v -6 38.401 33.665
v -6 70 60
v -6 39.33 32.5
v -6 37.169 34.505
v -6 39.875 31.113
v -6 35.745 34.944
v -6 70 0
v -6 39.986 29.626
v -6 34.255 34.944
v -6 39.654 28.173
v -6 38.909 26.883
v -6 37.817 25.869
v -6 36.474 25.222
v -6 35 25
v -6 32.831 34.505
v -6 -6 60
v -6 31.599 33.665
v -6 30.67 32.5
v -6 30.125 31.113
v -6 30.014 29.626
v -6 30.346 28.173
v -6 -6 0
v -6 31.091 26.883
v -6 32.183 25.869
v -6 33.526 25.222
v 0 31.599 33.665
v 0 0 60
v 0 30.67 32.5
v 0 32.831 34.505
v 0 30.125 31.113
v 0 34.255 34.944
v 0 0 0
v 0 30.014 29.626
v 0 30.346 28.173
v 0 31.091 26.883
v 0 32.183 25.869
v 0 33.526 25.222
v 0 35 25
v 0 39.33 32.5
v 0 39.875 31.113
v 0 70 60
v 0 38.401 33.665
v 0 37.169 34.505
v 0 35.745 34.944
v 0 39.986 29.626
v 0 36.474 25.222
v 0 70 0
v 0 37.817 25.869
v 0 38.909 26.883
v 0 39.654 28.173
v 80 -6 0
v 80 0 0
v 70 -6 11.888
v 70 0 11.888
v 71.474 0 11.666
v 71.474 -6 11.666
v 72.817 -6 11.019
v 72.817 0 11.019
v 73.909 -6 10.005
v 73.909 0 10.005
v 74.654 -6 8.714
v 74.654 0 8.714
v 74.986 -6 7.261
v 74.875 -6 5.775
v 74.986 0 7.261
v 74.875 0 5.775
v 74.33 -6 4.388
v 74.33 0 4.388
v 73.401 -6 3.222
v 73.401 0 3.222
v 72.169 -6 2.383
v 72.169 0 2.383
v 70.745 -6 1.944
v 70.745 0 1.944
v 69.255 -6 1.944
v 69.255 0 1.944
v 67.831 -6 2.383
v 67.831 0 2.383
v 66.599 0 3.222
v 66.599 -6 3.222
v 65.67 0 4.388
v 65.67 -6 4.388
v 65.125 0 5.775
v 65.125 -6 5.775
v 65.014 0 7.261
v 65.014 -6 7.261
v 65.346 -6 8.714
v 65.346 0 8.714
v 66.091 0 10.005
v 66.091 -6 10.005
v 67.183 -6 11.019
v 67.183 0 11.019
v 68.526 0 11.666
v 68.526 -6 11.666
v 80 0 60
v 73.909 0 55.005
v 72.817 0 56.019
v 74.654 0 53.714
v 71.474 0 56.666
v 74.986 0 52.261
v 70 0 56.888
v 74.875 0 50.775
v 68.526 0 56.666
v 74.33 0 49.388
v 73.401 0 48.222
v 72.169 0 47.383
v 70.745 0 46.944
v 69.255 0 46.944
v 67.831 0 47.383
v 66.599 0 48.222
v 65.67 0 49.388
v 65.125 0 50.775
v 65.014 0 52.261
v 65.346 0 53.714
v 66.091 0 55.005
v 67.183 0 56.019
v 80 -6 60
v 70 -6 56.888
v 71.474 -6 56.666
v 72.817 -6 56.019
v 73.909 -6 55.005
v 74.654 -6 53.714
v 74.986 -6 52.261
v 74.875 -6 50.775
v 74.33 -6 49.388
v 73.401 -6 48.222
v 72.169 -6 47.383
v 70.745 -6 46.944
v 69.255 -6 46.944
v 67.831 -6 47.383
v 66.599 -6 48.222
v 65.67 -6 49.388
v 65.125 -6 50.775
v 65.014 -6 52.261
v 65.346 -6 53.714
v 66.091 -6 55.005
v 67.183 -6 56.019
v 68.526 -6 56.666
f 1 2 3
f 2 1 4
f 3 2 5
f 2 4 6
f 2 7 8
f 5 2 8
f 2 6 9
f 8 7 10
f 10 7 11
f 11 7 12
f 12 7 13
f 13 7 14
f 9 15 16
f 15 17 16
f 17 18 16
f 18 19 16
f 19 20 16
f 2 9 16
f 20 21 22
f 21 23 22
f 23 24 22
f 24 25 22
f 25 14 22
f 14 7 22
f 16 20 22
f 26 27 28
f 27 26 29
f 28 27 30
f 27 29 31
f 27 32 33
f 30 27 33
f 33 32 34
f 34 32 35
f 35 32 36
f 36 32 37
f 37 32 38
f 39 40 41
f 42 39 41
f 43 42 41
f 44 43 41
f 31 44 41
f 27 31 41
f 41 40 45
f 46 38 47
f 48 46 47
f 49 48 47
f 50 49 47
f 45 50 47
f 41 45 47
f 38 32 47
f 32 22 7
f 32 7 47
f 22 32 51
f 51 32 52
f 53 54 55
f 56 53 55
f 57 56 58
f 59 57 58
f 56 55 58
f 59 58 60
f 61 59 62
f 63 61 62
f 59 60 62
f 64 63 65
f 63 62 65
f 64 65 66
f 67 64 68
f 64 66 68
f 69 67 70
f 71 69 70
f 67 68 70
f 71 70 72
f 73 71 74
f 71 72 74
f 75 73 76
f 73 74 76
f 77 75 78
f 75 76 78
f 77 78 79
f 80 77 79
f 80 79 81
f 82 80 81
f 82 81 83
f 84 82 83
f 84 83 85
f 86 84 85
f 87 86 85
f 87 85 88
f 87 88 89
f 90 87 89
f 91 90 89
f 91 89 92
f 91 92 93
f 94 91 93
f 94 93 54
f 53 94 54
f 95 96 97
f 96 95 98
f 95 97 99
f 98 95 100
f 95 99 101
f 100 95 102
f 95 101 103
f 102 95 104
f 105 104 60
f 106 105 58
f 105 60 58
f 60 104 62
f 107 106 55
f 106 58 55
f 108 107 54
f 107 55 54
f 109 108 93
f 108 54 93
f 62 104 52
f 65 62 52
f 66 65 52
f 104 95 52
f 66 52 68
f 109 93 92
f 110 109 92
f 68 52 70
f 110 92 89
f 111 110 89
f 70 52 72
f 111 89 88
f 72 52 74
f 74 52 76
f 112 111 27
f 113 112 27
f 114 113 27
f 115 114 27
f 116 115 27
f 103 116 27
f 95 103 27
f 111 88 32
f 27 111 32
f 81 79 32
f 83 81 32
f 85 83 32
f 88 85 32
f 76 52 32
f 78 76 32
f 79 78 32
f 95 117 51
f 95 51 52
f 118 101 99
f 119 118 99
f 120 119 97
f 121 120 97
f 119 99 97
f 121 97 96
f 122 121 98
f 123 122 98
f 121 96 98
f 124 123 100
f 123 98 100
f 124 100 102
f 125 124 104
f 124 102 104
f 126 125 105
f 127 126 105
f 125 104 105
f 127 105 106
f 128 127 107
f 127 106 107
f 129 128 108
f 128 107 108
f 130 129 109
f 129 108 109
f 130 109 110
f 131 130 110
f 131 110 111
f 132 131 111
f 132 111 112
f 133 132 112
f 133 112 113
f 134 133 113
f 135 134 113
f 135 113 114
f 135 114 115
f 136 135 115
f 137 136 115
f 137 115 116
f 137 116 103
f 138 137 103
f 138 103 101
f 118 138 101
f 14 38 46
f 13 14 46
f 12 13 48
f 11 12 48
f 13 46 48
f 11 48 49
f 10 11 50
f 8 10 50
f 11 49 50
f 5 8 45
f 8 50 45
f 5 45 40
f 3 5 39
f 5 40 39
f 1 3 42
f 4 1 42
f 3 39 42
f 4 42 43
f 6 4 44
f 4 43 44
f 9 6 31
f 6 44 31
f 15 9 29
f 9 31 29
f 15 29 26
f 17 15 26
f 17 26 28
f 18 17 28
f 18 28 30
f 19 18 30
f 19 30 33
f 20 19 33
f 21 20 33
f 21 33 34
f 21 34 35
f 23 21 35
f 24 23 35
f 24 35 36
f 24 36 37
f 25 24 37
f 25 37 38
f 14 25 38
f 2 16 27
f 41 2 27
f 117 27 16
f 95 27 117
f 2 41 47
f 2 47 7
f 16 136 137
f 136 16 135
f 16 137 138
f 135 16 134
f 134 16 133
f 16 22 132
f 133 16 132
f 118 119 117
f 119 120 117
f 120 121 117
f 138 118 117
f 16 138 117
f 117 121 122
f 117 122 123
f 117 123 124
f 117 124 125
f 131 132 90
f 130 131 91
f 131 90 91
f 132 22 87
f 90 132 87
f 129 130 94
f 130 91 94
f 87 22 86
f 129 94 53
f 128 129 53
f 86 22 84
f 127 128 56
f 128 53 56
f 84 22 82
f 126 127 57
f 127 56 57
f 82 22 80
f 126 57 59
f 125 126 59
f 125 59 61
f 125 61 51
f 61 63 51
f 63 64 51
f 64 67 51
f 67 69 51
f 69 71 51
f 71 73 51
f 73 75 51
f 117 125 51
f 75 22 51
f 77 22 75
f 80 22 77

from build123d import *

# Parameters (mm, degrees)
EXTRUDE_THIN1_DEPTH = 60
SKETCH2_R           = 5
CUT_EXTRUDE1_DEPTH  = 123.065556157
SKETCH3_R           = 5
CUT_EXTRUDE2_DEPTH  = 123.065556157


with BuildPart() as part:
    # Sketch1 → Extrude-Thin1 (new body)
    with BuildSketch(Plane.XY):
        Polygon((80, 0), (0, 0), (0, 70), (-6, 70), (-6, -6), (80, -6), align=None)
    extrude(amount=EXTRUDE_THIN1_DEPTH)

    # Sketch2 → Cut-Extrude1 (cut, through all)
    with BuildSketch(Plane(origin=(0, 0, 0), x_dir=(1, 0, 0), z_dir=(0, 1, 0))):
        with Locations(Location((70, -6.887679605, 0), (0, 0, 270))):
            Circle(SKETCH2_R)
        with Locations(Location((70, -51.887679605, 0), (0, 0, 270))):
            Circle(SKETCH2_R)
    extrude(amount=-CUT_EXTRUDE1_DEPTH, mode=Mode.SUBTRACT)

    # Sketch3 → Cut-Extrude2 (cut, through all)
    with BuildSketch(Plane(origin=(0, 0, 0), x_dir=(0, 0, -1), z_dir=(1, 0, 0))):
        with Locations((-30, 35)):
            Circle(SKETCH3_R)
    extrude(amount=-CUT_EXTRUDE2_DEPTH, mode=Mode.SUBTRACT)


solid = part.part
